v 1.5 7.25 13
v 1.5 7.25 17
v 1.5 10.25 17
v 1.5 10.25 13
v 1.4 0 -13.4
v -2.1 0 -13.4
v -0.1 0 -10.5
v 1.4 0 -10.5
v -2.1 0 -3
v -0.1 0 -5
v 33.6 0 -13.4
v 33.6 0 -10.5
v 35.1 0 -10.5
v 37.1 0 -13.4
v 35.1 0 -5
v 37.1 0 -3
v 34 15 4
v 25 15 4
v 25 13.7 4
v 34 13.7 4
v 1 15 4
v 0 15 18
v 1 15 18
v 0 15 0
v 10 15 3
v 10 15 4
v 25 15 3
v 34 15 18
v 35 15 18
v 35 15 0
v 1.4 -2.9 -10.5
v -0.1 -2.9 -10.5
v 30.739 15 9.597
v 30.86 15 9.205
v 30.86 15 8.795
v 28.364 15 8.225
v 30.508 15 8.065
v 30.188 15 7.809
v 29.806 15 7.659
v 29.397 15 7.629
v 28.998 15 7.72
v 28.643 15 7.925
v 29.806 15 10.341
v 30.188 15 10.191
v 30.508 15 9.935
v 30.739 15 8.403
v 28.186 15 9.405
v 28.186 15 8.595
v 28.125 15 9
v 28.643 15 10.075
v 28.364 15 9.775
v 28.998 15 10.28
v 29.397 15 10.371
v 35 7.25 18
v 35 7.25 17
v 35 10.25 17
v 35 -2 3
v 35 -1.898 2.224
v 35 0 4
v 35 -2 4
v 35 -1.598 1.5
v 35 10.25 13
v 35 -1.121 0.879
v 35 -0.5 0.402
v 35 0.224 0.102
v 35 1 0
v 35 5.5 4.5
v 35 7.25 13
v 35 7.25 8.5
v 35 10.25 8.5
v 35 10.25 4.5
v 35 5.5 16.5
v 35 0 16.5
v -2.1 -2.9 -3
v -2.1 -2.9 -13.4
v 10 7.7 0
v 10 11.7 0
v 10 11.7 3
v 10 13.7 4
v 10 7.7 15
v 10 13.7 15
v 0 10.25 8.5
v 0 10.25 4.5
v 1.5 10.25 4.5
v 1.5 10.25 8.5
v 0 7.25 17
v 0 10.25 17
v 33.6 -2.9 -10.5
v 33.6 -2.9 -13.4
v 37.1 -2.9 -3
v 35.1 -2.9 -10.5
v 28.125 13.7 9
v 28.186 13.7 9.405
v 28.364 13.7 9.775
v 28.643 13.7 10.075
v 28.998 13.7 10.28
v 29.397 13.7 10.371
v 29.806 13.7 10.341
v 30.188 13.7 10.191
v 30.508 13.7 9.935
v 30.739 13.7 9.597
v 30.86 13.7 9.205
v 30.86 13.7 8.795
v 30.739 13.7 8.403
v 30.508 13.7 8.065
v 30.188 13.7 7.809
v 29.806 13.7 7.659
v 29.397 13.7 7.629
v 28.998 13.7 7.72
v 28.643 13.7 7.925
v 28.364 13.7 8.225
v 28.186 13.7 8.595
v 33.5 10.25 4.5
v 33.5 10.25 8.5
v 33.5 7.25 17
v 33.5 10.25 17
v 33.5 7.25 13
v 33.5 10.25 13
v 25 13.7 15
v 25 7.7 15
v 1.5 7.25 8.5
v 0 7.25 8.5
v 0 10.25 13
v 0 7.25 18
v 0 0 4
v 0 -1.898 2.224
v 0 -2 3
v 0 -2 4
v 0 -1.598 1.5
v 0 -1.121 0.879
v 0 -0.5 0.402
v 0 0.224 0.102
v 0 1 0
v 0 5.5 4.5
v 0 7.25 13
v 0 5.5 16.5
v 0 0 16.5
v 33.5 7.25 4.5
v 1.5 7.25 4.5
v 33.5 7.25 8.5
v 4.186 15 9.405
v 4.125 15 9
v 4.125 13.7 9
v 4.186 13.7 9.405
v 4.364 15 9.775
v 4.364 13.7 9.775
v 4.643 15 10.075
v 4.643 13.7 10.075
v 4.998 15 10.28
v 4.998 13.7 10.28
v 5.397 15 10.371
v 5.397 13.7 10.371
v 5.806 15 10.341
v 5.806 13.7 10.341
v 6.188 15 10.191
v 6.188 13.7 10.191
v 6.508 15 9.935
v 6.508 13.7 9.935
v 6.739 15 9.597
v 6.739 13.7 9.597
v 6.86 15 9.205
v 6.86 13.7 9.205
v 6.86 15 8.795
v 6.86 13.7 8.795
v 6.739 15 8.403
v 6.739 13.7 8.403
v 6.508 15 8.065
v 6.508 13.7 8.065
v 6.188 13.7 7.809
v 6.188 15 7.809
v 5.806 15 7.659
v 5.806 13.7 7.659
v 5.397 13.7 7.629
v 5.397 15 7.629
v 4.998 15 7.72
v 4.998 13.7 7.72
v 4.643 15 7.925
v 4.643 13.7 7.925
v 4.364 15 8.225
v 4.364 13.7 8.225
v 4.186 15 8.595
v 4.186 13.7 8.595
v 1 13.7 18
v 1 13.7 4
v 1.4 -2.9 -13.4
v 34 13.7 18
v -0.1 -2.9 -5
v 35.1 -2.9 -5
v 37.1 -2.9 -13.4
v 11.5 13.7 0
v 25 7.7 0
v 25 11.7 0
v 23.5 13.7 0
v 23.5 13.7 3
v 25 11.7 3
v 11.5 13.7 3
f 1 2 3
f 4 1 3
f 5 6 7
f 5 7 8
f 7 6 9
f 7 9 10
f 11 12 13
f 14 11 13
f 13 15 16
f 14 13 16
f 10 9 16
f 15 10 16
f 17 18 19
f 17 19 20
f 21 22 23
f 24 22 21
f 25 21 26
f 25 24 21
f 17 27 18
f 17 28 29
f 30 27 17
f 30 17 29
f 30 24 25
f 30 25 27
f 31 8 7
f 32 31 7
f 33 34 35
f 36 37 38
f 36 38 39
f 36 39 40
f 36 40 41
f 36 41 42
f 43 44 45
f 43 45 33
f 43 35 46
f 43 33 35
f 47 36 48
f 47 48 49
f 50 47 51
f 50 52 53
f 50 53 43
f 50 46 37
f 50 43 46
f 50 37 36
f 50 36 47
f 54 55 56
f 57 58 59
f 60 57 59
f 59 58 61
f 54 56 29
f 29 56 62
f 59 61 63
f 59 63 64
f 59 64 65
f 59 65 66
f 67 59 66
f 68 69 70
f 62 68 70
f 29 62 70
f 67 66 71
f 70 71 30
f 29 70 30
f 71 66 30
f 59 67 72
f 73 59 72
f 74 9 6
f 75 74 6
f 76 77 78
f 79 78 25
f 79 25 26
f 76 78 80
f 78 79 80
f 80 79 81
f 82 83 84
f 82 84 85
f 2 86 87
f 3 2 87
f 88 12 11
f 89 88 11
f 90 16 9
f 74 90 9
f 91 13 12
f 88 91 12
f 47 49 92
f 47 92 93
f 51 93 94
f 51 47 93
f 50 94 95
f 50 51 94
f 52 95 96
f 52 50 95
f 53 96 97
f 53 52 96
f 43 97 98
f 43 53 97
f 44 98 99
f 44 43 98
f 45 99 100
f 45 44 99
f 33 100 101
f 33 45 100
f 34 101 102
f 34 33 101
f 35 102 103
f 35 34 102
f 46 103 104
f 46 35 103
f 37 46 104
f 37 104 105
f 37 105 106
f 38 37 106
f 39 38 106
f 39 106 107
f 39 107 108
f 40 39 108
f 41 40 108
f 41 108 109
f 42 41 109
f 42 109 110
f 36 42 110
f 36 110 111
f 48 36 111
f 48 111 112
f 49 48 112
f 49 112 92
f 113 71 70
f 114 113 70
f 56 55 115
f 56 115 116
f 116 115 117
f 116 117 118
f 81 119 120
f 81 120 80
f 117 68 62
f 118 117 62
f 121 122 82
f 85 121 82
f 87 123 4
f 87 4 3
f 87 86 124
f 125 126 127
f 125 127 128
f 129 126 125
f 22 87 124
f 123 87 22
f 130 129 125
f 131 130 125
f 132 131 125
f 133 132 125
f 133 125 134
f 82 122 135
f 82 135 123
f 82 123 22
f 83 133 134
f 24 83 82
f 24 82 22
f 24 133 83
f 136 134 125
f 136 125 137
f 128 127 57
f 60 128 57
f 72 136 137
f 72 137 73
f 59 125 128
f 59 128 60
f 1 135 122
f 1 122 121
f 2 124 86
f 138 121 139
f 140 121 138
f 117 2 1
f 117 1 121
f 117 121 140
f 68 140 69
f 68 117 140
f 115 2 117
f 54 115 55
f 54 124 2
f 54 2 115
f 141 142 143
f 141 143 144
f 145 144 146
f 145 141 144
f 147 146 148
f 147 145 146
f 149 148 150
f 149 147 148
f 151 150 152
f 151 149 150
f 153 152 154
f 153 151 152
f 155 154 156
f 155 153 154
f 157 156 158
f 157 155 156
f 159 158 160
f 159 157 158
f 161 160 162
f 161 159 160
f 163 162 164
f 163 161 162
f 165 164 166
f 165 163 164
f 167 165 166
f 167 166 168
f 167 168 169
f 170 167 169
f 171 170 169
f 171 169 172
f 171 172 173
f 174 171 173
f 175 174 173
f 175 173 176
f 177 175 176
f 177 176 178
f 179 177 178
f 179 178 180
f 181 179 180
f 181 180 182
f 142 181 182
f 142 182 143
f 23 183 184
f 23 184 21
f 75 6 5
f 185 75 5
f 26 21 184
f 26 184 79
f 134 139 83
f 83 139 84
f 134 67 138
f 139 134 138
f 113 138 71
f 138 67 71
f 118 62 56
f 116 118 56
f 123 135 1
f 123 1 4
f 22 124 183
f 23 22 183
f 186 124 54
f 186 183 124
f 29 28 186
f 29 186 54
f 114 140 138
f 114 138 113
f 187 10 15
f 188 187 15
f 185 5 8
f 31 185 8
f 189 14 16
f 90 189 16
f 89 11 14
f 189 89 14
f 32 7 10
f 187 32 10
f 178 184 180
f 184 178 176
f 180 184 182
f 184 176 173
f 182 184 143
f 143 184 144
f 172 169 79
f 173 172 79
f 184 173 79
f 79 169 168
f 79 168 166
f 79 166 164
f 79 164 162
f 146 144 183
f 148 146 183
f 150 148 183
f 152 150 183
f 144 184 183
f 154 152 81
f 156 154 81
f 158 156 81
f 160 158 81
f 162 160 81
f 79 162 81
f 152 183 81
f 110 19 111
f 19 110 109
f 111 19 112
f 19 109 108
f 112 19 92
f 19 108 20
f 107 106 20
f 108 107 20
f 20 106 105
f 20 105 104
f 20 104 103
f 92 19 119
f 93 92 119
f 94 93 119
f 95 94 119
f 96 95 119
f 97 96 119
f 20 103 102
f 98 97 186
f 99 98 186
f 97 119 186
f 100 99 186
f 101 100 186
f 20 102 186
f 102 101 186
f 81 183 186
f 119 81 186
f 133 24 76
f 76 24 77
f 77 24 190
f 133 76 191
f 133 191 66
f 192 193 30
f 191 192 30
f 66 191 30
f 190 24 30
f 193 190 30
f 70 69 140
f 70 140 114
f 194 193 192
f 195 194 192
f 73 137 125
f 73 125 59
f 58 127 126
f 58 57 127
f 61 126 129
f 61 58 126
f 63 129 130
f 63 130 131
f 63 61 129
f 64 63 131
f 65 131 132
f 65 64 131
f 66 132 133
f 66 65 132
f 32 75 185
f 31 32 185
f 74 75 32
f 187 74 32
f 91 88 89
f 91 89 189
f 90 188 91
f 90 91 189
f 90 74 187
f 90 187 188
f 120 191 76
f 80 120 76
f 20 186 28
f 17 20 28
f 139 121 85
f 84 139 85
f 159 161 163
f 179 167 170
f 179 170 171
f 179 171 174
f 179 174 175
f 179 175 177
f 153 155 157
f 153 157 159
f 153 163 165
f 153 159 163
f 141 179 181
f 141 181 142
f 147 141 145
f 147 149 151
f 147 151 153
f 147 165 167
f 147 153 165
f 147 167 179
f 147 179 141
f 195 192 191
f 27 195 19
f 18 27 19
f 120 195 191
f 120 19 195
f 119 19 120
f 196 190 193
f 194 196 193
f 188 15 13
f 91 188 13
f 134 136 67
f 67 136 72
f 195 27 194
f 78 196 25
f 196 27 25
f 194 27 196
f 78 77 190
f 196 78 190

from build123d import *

# Parameters (mm, degrees)
SKETCH_W        = 35
SKETCH_H        = 17
PAD_DEPTH       = 18
SKETCH001_W     = 35
SKETCH001_H     = 1.75
POCKET_DEPTH    = 13.5
POCKET001_DEPTH = 15
SKETCH003_W     = 33
SKETCH003_H     = 1.3
POCKET002_DEPTH = 14
SKETCH004_R     = 1.375
PAD001_DEPTH    = 1.5
SKETCH005_W     = 15
SKETCH005_H     = 12
POCKET003_DEPTH = 4
SKETCH006_W     = 35
SKETCH006_H     = 2
POCKET004_DEPTH = 14
SKETCH007_W     = 18
SKETCH007_H     = 14
POCKET005_DEPTH = 0.5
FILLET_R        = 3
SKETCH008_W     = 35
SKETCH008_H     = 5.5
POCKET006_DEPTH = 1.5
SKETCH009_W     = 3
SKETCH009_H     = 4
POCKET007_DEPTH = 1.5
SKETCH010_W     = 3
SKETCH010_H     = 4
POCKET008_DEPTH = 1.5
PAD002_DEPTH    = 2.9


with BuildPart() as body:
    # Sketch → Pad (new body)
    with BuildSketch(Plane.XY):
        with Locations((17.5, 6.5)):
            Rectangle(SKETCH_W, SKETCH_H)
    extrude(amount=PAD_DEPTH)

    # Sketch001 (on DatumPlane) → Pocket (cut)
    with BuildSketch(Plane.XY.offset(18)):
        with Locations((17.5, 6.375)):
            Rectangle(SKETCH001_W, SKETCH001_H)
    extrude(amount=-POCKET_DEPTH, mode=Mode.SUBTRACT)

    # Sketch002 (on DatumPlane) → Pocket001 (cut)
    with BuildSketch(Plane(origin=(0, 0, 0), x_dir=(1, 0, 0), z_dir=(0, 0, -1))):
        Polygon((11.5, -13.7), (23.5, -13.7), (25, -11.7), (25, -7.7), (10, -7.7), (10, -11.7), align=None)
    extrude(amount=-POCKET001_DEPTH, mode=Mode.SUBTRACT)

    # Sketch003 (on DatumPlane) → Pocket002 (cut)
    with BuildSketch(Plane.XY.offset(18)):
        with Locations((17.5, 14.35)):
            Rectangle(SKETCH003_W, SKETCH003_H)
    extrude(amount=-POCKET002_DEPTH, mode=Mode.SUBTRACT)

    # Sketch004 (on DatumPlane) → Pad001 (join)
    with BuildSketch(Plane(origin=(0, 15, 0), x_dir=(-1, 0, 0), z_dir=(0, 1, 0))):
        with Locations((-29.5, 9)):
            Circle(SKETCH004_R)
        with Locations((-5.5, 9)):
            Circle(SKETCH004_R)
    extrude(amount=-PAD001_DEPTH)

    # Sketch005 (on DatumPlane) → Pocket003 (cut)
    with BuildSketch(Plane(origin=(0, 15, 0), x_dir=(-1, 0, 0), z_dir=(0, 1, 0))):
        with Locations((-17.5, 9)):
            Rectangle(SKETCH005_W, SKETCH005_H)
    extrude(amount=-POCKET003_DEPTH, mode=Mode.SUBTRACT)

    # Sketch006 (on DatumPlane) → Pocket004 (cut)
    with BuildSketch(Plane.XY.offset(18)):
        with Locations((17.5, -1)):
            Rectangle(SKETCH006_W, SKETCH006_H)
    extrude(amount=-POCKET004_DEPTH, mode=Mode.SUBTRACT)

    # Sketch007 (on DatumPlane) → Pocket005 (cut)
    with BuildSketch(Plane(origin=(0, 15, 0), x_dir=(-1, 0, 0), z_dir=(0, 1, 0))):
        with Locations((-17.5, 11)):
            Rectangle(SKETCH007_W, SKETCH007_H)
    extrude(amount=-POCKET005_DEPTH, mode=Mode.SUBTRACT)

    # Fillet
    fillet_edges = [body.edges().sort_by_distance(p)[0] for p in [
        (17.5, -2, 0),
    ]]
    fillet(fillet_edges, radius=FILLET_R)

    # Sketch008 (on DatumPlane) → Pocket006 (cut)
    with BuildSketch(Plane.XY.offset(18)):
        with Locations((17.5, 2.75)):
            Rectangle(SKETCH008_W, SKETCH008_H)
    extrude(amount=-POCKET006_DEPTH, mode=Mode.SUBTRACT)

    # Sketch009 (on DatumPlane) → Pocket007 (cut)
    with BuildSketch(Plane.YZ):
        with Locations((8.75, 15)):
            Rectangle(SKETCH009_W, SKETCH009_H)
        with Locations((8.75, 6.5)):
            Rectangle(SKETCH009_W, SKETCH009_H)
    extrude(amount=POCKET007_DEPTH, mode=Mode.SUBTRACT)

    # Sketch010 (on DatumPlane) → Pocket008 (cut)
    with BuildSketch(Plane.YZ.offset(35)):
        with Locations((8.75, 15)):
            Rectangle(SKETCH010_W, SKETCH010_H)
        with Locations((8.75, 6.5)):
            Rectangle(SKETCH010_W, SKETCH010_H)
    extrude(amount=-POCKET008_DEPTH, mode=Mode.SUBTRACT)


with BuildPart() as bodylatch:
    # Sketch011 → Pad002 (new body)
    with BuildSketch(Plane.XZ):
        Polygon((-0.1, -5), (35.1, -5), (35.1, -10.5), (33.6, -10.5), (33.6, -13.4), (37.1, -13.4), (37.1, -3), (-2.1, -3), (-2.1, -13.4), (1.4, -13.4), (1.4, -10.5), (-0.1, -10.5), align=None)
    extrude(amount=PAD002_DEPTH)


solid = Compound([body.part, bodylatch.part])
